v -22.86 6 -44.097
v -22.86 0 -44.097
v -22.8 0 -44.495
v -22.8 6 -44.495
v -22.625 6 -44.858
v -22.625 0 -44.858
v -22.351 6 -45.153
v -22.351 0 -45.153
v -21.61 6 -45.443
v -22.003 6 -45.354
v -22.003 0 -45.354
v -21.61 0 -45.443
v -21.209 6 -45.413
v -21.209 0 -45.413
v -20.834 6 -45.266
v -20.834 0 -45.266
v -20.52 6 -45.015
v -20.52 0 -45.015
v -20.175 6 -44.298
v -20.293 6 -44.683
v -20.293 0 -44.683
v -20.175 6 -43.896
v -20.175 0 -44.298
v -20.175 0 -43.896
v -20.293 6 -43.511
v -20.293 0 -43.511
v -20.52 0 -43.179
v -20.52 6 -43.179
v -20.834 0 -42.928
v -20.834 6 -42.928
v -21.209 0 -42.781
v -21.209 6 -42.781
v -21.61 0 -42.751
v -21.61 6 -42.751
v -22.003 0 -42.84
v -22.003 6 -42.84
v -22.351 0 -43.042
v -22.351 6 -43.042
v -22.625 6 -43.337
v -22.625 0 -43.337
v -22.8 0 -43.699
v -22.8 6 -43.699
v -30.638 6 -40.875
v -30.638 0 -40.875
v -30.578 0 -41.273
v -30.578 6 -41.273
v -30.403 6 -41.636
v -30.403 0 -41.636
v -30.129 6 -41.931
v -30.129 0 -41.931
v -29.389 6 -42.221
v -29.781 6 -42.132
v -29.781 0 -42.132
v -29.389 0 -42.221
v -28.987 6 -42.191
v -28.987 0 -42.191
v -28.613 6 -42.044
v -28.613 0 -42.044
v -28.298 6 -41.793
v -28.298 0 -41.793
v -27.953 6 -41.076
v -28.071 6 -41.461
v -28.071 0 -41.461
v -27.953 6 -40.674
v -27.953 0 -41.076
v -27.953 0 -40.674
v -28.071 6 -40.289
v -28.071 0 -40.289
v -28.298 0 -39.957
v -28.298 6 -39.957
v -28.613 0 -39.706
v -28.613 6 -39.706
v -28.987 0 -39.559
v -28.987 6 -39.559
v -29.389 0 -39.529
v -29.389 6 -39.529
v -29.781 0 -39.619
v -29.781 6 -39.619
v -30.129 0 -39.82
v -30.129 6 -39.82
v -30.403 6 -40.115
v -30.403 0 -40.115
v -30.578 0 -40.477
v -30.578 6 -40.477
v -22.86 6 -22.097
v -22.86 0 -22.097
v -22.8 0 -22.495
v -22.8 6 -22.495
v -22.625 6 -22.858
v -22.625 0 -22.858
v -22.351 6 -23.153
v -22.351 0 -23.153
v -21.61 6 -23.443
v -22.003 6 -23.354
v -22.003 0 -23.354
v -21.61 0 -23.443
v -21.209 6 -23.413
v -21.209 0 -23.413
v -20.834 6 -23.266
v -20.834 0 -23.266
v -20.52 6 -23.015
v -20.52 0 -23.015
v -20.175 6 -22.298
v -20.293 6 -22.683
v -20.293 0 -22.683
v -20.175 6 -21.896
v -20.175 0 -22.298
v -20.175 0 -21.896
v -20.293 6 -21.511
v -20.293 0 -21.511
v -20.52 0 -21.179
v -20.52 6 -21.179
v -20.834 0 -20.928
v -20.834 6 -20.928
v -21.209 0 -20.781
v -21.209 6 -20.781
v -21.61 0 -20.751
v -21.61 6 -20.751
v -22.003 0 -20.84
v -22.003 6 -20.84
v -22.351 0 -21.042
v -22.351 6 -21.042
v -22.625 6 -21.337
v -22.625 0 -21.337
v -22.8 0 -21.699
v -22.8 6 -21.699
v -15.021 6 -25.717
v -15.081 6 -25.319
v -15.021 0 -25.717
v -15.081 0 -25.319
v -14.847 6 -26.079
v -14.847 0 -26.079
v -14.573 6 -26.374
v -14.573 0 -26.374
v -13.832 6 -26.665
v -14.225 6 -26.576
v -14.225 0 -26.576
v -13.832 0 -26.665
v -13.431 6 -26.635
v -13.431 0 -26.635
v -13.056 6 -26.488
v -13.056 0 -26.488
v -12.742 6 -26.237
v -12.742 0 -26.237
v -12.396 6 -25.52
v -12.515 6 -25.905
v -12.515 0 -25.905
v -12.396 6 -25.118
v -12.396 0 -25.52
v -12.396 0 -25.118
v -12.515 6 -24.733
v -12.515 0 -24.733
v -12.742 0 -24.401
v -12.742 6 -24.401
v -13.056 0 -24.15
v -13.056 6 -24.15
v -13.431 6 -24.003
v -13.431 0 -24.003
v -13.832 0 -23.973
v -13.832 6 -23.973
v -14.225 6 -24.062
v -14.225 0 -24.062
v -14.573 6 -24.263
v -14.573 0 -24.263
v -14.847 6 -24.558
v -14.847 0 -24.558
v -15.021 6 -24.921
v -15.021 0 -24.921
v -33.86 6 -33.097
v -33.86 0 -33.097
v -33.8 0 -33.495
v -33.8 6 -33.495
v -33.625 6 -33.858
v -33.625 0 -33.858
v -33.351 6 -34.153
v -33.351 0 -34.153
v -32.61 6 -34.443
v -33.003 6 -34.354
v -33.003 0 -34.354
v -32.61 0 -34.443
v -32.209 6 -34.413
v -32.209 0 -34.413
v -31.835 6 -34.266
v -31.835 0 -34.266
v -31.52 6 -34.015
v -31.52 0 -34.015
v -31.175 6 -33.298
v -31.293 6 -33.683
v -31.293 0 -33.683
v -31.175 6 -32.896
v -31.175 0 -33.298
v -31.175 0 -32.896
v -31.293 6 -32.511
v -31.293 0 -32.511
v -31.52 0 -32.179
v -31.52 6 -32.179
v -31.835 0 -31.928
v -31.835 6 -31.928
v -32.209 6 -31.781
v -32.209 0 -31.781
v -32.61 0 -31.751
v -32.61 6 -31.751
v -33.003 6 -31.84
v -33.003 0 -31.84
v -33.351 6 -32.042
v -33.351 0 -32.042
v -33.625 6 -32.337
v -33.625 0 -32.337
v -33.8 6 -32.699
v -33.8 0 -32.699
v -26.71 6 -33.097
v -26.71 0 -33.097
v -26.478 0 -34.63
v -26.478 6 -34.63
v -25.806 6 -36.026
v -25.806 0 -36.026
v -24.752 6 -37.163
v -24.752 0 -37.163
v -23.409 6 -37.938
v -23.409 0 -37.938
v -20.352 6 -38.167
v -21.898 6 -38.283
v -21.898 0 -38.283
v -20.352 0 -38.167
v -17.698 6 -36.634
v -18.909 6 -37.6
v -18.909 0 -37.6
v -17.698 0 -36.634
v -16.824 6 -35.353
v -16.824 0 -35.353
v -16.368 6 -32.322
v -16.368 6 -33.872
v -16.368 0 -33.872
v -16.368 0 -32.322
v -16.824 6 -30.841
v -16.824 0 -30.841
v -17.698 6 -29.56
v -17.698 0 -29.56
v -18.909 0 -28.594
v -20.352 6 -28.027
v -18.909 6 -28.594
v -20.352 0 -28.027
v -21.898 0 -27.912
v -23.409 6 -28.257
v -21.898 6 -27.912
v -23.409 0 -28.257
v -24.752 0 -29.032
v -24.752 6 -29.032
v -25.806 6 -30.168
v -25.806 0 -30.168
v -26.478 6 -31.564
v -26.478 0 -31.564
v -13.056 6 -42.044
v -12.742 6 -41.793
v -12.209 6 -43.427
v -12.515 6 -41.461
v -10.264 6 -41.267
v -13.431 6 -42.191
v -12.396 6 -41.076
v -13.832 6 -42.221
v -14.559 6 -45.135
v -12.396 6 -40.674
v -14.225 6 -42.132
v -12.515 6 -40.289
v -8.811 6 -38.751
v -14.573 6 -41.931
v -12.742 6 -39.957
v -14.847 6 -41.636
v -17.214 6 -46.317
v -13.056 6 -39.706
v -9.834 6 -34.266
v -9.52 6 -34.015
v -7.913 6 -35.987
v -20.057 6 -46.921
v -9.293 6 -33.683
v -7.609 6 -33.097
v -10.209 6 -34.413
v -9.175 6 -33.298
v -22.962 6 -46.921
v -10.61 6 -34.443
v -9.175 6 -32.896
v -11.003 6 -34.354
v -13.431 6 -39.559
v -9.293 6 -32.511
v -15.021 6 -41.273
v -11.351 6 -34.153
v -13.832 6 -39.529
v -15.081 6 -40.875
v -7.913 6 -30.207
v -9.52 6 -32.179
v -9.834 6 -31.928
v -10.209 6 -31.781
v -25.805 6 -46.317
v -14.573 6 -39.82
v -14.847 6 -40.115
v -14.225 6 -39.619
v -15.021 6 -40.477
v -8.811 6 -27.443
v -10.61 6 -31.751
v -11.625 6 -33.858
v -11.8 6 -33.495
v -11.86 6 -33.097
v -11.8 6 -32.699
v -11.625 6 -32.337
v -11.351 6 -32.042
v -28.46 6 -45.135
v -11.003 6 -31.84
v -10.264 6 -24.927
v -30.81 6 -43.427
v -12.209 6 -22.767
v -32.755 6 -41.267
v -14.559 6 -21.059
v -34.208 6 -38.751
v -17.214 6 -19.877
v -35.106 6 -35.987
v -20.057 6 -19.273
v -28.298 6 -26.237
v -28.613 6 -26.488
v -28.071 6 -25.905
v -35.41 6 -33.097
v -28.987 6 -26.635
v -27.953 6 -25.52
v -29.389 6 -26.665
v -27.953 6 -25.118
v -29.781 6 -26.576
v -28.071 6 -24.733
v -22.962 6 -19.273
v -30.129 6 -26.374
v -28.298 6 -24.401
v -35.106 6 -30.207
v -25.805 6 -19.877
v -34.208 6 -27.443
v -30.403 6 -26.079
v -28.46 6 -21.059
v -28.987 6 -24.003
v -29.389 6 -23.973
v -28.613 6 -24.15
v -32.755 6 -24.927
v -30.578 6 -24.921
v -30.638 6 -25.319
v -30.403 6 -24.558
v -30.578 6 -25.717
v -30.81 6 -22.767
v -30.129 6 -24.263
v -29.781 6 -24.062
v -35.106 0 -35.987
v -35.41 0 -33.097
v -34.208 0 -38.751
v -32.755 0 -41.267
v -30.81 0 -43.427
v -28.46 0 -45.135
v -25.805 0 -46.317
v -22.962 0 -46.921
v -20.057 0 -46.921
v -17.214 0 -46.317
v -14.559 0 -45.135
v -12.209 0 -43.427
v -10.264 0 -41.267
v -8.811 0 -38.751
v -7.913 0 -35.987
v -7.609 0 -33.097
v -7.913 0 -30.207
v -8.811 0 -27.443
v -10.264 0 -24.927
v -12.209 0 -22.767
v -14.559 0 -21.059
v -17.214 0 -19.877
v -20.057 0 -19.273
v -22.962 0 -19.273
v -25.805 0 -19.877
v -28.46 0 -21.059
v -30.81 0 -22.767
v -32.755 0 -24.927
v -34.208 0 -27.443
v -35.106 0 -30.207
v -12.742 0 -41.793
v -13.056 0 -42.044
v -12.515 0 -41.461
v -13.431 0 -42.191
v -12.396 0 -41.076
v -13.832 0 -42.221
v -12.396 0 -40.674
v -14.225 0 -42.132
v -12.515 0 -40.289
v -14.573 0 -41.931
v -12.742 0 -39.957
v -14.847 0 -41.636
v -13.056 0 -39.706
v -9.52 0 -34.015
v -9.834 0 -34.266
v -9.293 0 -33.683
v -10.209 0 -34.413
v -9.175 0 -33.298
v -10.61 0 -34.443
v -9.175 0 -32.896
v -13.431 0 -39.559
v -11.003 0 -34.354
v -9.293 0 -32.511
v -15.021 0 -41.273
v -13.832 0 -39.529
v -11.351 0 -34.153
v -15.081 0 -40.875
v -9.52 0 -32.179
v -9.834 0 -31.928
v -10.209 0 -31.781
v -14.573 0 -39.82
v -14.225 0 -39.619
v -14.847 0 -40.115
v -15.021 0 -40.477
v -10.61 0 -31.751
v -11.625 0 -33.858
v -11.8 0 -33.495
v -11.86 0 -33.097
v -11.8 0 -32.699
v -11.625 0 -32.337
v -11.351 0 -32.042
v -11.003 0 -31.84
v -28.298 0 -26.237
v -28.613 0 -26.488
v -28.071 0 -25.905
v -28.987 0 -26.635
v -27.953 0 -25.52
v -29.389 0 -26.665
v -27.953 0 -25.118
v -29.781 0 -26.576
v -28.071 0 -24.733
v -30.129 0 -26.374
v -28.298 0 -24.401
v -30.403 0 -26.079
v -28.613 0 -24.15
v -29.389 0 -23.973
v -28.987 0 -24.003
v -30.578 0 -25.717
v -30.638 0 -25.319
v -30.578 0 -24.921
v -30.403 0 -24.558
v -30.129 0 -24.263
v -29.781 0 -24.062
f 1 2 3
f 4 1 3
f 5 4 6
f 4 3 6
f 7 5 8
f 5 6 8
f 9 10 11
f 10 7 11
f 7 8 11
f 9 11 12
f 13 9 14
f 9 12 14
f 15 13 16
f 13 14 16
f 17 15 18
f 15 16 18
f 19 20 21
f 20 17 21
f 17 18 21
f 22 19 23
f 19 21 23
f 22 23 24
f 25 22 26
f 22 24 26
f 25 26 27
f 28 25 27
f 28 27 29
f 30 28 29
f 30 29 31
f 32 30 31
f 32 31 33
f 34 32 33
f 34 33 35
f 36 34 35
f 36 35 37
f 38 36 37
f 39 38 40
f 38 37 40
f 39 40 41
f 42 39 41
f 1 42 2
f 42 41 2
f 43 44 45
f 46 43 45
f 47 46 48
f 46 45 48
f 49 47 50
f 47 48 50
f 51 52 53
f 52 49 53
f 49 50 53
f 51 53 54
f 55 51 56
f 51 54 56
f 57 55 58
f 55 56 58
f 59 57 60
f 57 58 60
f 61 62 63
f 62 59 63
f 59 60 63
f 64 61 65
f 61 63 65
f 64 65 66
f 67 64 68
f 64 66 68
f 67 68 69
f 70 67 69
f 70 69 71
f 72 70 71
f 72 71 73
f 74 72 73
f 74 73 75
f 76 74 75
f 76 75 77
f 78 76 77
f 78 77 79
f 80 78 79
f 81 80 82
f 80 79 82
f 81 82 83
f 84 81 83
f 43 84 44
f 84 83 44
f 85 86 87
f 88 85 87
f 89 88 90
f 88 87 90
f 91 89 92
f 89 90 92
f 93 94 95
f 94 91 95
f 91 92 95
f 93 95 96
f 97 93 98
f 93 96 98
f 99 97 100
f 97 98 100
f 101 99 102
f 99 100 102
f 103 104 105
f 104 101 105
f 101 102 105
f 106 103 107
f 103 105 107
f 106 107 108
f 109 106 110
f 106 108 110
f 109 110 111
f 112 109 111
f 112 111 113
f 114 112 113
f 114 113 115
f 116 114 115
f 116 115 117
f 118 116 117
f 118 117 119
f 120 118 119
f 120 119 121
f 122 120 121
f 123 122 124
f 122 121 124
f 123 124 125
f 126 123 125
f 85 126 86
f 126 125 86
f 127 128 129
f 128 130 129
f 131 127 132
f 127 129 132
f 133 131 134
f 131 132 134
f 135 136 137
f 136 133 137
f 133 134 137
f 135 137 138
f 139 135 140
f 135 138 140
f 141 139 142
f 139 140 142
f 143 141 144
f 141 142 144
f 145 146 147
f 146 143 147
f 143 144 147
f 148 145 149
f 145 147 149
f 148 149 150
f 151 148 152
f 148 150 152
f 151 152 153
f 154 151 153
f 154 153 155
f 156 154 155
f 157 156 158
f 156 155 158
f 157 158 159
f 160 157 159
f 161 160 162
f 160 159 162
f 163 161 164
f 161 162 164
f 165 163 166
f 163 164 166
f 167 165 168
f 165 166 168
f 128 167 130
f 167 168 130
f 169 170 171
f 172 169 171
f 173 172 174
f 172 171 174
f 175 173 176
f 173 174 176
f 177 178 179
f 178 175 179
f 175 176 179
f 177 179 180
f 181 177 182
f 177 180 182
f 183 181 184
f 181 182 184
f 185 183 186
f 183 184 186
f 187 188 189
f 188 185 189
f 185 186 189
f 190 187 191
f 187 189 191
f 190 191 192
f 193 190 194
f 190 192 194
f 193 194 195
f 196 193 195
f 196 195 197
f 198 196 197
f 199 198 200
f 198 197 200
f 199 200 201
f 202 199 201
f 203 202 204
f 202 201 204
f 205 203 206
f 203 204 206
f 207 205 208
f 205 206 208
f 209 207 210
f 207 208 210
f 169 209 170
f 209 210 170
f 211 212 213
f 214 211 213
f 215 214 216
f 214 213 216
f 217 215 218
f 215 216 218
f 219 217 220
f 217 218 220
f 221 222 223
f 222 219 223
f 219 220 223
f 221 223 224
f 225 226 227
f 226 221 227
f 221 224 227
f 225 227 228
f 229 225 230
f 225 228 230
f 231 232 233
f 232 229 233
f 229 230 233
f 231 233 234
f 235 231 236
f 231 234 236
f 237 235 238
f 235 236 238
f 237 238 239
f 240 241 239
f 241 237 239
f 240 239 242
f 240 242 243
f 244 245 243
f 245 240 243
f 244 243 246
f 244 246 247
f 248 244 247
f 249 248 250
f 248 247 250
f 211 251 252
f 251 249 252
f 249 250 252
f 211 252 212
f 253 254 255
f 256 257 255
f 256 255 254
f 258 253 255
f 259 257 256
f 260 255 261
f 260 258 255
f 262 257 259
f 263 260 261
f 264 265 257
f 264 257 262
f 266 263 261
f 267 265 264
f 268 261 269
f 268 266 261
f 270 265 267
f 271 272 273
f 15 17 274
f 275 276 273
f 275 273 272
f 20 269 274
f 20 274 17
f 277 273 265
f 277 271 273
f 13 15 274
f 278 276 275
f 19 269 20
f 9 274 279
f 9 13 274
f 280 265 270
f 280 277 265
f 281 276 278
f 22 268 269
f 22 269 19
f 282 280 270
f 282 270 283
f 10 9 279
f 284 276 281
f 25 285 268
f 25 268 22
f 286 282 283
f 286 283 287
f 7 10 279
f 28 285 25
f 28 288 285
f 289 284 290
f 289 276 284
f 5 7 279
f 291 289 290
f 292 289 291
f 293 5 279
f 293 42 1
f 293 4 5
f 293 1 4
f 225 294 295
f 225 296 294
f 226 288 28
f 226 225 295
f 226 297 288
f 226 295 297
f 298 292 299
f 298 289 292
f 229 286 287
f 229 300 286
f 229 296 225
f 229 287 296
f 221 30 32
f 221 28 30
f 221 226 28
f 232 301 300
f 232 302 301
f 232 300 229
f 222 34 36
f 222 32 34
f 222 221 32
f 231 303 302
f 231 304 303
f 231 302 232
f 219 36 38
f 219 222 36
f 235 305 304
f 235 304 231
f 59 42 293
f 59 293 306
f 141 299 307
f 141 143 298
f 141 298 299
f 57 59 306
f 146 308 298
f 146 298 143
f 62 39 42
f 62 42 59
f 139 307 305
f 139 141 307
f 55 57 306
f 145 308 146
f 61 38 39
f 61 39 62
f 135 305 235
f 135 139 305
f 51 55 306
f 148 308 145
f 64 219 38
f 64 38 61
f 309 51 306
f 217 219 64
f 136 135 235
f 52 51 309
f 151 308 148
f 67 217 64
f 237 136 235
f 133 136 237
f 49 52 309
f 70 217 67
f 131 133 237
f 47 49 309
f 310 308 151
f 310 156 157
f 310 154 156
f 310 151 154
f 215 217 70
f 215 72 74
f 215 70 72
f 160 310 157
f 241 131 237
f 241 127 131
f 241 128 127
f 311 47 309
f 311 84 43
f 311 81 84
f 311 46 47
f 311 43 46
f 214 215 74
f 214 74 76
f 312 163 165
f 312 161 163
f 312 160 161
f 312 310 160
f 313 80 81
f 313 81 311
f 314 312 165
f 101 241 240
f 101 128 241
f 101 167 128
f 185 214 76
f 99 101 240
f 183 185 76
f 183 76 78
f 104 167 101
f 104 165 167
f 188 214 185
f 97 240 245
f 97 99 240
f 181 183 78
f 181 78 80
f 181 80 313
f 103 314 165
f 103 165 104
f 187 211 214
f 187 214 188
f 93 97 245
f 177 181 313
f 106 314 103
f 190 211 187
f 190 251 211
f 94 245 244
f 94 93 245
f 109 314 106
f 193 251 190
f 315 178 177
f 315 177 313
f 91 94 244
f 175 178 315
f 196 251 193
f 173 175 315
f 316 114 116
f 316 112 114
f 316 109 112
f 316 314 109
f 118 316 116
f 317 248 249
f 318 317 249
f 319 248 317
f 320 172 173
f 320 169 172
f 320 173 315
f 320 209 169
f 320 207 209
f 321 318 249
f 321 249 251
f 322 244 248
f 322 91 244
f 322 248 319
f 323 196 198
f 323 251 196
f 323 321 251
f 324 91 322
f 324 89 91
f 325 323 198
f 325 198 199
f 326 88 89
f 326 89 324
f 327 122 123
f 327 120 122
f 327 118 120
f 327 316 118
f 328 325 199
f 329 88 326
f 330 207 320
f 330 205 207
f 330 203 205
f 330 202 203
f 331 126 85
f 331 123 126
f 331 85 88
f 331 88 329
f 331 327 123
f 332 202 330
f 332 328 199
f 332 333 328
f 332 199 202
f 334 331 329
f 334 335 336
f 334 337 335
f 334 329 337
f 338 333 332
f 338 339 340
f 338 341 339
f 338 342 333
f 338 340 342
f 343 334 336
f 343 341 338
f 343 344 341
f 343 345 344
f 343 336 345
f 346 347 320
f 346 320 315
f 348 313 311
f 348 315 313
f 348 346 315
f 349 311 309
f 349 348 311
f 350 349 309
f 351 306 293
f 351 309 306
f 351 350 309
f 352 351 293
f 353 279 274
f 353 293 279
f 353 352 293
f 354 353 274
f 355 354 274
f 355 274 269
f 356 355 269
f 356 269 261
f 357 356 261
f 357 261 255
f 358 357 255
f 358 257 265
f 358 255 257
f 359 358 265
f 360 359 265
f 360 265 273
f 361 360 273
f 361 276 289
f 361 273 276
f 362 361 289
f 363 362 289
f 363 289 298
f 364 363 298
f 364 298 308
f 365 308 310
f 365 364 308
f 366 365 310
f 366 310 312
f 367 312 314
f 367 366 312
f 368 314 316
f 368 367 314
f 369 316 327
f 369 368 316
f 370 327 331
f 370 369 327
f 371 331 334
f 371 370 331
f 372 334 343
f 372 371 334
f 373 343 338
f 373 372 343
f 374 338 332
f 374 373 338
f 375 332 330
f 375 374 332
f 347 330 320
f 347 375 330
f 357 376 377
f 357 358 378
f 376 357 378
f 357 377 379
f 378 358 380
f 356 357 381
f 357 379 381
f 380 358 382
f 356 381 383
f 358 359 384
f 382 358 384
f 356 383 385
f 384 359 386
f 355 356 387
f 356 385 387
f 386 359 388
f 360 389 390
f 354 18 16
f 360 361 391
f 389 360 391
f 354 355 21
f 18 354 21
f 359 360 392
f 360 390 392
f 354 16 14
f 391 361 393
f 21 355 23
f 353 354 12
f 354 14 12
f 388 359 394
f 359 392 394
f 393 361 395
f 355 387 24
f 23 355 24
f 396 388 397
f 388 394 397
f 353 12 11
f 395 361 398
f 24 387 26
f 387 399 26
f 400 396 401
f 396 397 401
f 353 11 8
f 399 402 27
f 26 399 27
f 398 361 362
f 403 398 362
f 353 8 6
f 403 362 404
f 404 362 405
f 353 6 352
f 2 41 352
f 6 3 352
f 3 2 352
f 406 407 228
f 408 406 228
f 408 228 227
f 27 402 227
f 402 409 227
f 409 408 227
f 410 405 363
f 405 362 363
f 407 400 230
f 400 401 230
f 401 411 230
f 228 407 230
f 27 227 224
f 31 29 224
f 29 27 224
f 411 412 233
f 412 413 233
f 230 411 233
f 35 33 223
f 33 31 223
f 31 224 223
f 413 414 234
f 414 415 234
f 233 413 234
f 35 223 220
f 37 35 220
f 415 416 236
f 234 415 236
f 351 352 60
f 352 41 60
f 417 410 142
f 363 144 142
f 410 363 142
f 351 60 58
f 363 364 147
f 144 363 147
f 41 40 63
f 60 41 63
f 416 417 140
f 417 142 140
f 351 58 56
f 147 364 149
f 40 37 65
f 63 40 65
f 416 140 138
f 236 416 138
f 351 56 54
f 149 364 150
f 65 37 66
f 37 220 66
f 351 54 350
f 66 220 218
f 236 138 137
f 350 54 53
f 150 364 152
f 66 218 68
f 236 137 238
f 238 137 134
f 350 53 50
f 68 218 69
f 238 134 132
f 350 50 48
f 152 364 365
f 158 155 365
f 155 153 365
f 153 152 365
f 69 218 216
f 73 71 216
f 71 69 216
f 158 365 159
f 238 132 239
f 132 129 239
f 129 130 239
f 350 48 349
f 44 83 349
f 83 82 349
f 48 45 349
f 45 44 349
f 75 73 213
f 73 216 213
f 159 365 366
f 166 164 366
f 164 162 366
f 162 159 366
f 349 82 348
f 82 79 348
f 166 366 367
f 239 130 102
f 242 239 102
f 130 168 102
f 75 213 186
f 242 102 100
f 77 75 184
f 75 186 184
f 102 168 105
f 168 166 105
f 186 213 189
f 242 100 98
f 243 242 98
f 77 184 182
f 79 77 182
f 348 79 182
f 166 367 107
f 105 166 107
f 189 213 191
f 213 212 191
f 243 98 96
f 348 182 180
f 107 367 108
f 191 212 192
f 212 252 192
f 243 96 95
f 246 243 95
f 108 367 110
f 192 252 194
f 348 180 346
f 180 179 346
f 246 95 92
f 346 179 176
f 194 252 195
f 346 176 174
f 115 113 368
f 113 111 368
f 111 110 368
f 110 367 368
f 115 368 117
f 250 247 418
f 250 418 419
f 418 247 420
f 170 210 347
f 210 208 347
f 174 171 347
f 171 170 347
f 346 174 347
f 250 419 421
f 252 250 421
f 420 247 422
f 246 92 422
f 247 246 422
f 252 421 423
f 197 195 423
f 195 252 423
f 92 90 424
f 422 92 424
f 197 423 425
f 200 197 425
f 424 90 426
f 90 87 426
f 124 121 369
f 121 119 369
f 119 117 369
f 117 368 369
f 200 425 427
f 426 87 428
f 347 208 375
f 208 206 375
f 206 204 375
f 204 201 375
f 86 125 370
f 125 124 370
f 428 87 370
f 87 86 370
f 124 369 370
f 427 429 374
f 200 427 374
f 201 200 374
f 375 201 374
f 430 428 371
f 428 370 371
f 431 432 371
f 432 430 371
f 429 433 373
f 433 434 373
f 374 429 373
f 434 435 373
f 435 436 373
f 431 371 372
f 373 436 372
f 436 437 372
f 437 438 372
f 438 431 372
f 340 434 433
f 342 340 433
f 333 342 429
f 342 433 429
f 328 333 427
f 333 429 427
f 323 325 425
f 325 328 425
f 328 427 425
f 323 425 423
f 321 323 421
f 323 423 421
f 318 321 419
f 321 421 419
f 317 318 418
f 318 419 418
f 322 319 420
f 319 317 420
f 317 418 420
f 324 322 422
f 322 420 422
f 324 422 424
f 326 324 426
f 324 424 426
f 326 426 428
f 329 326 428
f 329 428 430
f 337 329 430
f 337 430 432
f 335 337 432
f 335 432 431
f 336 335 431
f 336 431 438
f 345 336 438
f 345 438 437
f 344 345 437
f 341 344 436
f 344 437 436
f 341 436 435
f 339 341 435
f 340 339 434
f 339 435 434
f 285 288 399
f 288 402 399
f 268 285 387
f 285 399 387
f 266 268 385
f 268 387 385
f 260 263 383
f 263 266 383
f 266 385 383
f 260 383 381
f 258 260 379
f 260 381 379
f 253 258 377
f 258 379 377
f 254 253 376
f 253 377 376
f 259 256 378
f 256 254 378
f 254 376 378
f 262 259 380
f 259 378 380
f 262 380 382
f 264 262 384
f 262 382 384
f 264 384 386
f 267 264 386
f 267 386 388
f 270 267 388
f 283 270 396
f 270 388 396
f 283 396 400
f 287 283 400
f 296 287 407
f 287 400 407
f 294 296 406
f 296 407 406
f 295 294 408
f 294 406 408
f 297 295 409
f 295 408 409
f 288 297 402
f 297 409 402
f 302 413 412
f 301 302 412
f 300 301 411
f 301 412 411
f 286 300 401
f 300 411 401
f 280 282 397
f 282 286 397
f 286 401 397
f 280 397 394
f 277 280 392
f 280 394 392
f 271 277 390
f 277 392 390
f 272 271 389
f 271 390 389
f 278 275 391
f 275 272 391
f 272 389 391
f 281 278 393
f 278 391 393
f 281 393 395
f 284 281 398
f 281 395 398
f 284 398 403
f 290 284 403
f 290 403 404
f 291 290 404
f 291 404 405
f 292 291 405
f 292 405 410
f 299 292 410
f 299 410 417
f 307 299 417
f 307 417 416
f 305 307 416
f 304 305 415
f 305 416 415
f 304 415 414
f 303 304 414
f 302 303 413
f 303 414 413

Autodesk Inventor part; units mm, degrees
ref_plane "YZ Plane" through (0, 0, 0) normal (1, 0, 0) x (0, 1, 0)
ref_plane "XZ Plane" through (0, 0, 0) normal (0, 1, 0) x (-1, 0, 0)
ref_plane "XY Plane" through (0, 0, 0) normal (0, 0, 1) x (1, 0, 0)
sketch "스케치1" plane through (0, 0, 0) normal (0, 1, 0) x (-1, 0, 0)
  circle A0 centre (13.7314, -40.8752) radius 1.55
  circle A1 centre (29.2877, -40.8752) radius 1.55
  circle A2 centre (29.2877, -25.3189) radius 1.55
  circle A3 centre (13.7314, -25.3189) radius 1.55
  circle A4 centre (21.5095, -33.0971) radius 13.9
  circle A5 centre (21.5095, -22.0971) radius 1.55
  circle A6 centre (32.5095, -33.0971) radius 1.55
  circle A7 centre (21.5095, -44.0971) radius 1.55
  circle A8 centre (10.5095, -33.0971) radius 1.55
  circle A9 centre (21.5095, -33.0971) radius 5.2
  circle A10 centre (29.2877, -40.8752) radius 1.35
  circle A11 centre (21.5095, -44.0971) radius 1.35
  circle A12 centre (13.7314, -40.8752) radius 1.35
  circle A13 centre (10.5095, -33.0971) radius 1.35
  circle A14 centre (13.7314, -25.3189) radius 1.35
  circle A15 centre (21.5095, -22.0971) radius 1.35
  circle A16 centre (29.2877, -25.3189) radius 1.35
  circle A17 centre (32.5095, -33.0971) radius 1.35
  point P0 (0, 0)
  point P1 (21.5095, -33.0971)
  dimension "d3" = 2.7
  dimension "d4" = 2.7
  dimension "d5" = 2.7
  dimension "d6" = 2.7
  dimension "d7" = 2.7
  dimension "d8" = 2.7
  dimension "d9" = 2.7
  dimension "d10" = 2.7
extrude "돌출1" add sketch "스케치1" along normal blind 6 contours A0 | A1 | A2 | A3 | A4 | A5 | A6 | A7 | A8
properties part number "long_horn1" material "PMMA 플라스틱"
